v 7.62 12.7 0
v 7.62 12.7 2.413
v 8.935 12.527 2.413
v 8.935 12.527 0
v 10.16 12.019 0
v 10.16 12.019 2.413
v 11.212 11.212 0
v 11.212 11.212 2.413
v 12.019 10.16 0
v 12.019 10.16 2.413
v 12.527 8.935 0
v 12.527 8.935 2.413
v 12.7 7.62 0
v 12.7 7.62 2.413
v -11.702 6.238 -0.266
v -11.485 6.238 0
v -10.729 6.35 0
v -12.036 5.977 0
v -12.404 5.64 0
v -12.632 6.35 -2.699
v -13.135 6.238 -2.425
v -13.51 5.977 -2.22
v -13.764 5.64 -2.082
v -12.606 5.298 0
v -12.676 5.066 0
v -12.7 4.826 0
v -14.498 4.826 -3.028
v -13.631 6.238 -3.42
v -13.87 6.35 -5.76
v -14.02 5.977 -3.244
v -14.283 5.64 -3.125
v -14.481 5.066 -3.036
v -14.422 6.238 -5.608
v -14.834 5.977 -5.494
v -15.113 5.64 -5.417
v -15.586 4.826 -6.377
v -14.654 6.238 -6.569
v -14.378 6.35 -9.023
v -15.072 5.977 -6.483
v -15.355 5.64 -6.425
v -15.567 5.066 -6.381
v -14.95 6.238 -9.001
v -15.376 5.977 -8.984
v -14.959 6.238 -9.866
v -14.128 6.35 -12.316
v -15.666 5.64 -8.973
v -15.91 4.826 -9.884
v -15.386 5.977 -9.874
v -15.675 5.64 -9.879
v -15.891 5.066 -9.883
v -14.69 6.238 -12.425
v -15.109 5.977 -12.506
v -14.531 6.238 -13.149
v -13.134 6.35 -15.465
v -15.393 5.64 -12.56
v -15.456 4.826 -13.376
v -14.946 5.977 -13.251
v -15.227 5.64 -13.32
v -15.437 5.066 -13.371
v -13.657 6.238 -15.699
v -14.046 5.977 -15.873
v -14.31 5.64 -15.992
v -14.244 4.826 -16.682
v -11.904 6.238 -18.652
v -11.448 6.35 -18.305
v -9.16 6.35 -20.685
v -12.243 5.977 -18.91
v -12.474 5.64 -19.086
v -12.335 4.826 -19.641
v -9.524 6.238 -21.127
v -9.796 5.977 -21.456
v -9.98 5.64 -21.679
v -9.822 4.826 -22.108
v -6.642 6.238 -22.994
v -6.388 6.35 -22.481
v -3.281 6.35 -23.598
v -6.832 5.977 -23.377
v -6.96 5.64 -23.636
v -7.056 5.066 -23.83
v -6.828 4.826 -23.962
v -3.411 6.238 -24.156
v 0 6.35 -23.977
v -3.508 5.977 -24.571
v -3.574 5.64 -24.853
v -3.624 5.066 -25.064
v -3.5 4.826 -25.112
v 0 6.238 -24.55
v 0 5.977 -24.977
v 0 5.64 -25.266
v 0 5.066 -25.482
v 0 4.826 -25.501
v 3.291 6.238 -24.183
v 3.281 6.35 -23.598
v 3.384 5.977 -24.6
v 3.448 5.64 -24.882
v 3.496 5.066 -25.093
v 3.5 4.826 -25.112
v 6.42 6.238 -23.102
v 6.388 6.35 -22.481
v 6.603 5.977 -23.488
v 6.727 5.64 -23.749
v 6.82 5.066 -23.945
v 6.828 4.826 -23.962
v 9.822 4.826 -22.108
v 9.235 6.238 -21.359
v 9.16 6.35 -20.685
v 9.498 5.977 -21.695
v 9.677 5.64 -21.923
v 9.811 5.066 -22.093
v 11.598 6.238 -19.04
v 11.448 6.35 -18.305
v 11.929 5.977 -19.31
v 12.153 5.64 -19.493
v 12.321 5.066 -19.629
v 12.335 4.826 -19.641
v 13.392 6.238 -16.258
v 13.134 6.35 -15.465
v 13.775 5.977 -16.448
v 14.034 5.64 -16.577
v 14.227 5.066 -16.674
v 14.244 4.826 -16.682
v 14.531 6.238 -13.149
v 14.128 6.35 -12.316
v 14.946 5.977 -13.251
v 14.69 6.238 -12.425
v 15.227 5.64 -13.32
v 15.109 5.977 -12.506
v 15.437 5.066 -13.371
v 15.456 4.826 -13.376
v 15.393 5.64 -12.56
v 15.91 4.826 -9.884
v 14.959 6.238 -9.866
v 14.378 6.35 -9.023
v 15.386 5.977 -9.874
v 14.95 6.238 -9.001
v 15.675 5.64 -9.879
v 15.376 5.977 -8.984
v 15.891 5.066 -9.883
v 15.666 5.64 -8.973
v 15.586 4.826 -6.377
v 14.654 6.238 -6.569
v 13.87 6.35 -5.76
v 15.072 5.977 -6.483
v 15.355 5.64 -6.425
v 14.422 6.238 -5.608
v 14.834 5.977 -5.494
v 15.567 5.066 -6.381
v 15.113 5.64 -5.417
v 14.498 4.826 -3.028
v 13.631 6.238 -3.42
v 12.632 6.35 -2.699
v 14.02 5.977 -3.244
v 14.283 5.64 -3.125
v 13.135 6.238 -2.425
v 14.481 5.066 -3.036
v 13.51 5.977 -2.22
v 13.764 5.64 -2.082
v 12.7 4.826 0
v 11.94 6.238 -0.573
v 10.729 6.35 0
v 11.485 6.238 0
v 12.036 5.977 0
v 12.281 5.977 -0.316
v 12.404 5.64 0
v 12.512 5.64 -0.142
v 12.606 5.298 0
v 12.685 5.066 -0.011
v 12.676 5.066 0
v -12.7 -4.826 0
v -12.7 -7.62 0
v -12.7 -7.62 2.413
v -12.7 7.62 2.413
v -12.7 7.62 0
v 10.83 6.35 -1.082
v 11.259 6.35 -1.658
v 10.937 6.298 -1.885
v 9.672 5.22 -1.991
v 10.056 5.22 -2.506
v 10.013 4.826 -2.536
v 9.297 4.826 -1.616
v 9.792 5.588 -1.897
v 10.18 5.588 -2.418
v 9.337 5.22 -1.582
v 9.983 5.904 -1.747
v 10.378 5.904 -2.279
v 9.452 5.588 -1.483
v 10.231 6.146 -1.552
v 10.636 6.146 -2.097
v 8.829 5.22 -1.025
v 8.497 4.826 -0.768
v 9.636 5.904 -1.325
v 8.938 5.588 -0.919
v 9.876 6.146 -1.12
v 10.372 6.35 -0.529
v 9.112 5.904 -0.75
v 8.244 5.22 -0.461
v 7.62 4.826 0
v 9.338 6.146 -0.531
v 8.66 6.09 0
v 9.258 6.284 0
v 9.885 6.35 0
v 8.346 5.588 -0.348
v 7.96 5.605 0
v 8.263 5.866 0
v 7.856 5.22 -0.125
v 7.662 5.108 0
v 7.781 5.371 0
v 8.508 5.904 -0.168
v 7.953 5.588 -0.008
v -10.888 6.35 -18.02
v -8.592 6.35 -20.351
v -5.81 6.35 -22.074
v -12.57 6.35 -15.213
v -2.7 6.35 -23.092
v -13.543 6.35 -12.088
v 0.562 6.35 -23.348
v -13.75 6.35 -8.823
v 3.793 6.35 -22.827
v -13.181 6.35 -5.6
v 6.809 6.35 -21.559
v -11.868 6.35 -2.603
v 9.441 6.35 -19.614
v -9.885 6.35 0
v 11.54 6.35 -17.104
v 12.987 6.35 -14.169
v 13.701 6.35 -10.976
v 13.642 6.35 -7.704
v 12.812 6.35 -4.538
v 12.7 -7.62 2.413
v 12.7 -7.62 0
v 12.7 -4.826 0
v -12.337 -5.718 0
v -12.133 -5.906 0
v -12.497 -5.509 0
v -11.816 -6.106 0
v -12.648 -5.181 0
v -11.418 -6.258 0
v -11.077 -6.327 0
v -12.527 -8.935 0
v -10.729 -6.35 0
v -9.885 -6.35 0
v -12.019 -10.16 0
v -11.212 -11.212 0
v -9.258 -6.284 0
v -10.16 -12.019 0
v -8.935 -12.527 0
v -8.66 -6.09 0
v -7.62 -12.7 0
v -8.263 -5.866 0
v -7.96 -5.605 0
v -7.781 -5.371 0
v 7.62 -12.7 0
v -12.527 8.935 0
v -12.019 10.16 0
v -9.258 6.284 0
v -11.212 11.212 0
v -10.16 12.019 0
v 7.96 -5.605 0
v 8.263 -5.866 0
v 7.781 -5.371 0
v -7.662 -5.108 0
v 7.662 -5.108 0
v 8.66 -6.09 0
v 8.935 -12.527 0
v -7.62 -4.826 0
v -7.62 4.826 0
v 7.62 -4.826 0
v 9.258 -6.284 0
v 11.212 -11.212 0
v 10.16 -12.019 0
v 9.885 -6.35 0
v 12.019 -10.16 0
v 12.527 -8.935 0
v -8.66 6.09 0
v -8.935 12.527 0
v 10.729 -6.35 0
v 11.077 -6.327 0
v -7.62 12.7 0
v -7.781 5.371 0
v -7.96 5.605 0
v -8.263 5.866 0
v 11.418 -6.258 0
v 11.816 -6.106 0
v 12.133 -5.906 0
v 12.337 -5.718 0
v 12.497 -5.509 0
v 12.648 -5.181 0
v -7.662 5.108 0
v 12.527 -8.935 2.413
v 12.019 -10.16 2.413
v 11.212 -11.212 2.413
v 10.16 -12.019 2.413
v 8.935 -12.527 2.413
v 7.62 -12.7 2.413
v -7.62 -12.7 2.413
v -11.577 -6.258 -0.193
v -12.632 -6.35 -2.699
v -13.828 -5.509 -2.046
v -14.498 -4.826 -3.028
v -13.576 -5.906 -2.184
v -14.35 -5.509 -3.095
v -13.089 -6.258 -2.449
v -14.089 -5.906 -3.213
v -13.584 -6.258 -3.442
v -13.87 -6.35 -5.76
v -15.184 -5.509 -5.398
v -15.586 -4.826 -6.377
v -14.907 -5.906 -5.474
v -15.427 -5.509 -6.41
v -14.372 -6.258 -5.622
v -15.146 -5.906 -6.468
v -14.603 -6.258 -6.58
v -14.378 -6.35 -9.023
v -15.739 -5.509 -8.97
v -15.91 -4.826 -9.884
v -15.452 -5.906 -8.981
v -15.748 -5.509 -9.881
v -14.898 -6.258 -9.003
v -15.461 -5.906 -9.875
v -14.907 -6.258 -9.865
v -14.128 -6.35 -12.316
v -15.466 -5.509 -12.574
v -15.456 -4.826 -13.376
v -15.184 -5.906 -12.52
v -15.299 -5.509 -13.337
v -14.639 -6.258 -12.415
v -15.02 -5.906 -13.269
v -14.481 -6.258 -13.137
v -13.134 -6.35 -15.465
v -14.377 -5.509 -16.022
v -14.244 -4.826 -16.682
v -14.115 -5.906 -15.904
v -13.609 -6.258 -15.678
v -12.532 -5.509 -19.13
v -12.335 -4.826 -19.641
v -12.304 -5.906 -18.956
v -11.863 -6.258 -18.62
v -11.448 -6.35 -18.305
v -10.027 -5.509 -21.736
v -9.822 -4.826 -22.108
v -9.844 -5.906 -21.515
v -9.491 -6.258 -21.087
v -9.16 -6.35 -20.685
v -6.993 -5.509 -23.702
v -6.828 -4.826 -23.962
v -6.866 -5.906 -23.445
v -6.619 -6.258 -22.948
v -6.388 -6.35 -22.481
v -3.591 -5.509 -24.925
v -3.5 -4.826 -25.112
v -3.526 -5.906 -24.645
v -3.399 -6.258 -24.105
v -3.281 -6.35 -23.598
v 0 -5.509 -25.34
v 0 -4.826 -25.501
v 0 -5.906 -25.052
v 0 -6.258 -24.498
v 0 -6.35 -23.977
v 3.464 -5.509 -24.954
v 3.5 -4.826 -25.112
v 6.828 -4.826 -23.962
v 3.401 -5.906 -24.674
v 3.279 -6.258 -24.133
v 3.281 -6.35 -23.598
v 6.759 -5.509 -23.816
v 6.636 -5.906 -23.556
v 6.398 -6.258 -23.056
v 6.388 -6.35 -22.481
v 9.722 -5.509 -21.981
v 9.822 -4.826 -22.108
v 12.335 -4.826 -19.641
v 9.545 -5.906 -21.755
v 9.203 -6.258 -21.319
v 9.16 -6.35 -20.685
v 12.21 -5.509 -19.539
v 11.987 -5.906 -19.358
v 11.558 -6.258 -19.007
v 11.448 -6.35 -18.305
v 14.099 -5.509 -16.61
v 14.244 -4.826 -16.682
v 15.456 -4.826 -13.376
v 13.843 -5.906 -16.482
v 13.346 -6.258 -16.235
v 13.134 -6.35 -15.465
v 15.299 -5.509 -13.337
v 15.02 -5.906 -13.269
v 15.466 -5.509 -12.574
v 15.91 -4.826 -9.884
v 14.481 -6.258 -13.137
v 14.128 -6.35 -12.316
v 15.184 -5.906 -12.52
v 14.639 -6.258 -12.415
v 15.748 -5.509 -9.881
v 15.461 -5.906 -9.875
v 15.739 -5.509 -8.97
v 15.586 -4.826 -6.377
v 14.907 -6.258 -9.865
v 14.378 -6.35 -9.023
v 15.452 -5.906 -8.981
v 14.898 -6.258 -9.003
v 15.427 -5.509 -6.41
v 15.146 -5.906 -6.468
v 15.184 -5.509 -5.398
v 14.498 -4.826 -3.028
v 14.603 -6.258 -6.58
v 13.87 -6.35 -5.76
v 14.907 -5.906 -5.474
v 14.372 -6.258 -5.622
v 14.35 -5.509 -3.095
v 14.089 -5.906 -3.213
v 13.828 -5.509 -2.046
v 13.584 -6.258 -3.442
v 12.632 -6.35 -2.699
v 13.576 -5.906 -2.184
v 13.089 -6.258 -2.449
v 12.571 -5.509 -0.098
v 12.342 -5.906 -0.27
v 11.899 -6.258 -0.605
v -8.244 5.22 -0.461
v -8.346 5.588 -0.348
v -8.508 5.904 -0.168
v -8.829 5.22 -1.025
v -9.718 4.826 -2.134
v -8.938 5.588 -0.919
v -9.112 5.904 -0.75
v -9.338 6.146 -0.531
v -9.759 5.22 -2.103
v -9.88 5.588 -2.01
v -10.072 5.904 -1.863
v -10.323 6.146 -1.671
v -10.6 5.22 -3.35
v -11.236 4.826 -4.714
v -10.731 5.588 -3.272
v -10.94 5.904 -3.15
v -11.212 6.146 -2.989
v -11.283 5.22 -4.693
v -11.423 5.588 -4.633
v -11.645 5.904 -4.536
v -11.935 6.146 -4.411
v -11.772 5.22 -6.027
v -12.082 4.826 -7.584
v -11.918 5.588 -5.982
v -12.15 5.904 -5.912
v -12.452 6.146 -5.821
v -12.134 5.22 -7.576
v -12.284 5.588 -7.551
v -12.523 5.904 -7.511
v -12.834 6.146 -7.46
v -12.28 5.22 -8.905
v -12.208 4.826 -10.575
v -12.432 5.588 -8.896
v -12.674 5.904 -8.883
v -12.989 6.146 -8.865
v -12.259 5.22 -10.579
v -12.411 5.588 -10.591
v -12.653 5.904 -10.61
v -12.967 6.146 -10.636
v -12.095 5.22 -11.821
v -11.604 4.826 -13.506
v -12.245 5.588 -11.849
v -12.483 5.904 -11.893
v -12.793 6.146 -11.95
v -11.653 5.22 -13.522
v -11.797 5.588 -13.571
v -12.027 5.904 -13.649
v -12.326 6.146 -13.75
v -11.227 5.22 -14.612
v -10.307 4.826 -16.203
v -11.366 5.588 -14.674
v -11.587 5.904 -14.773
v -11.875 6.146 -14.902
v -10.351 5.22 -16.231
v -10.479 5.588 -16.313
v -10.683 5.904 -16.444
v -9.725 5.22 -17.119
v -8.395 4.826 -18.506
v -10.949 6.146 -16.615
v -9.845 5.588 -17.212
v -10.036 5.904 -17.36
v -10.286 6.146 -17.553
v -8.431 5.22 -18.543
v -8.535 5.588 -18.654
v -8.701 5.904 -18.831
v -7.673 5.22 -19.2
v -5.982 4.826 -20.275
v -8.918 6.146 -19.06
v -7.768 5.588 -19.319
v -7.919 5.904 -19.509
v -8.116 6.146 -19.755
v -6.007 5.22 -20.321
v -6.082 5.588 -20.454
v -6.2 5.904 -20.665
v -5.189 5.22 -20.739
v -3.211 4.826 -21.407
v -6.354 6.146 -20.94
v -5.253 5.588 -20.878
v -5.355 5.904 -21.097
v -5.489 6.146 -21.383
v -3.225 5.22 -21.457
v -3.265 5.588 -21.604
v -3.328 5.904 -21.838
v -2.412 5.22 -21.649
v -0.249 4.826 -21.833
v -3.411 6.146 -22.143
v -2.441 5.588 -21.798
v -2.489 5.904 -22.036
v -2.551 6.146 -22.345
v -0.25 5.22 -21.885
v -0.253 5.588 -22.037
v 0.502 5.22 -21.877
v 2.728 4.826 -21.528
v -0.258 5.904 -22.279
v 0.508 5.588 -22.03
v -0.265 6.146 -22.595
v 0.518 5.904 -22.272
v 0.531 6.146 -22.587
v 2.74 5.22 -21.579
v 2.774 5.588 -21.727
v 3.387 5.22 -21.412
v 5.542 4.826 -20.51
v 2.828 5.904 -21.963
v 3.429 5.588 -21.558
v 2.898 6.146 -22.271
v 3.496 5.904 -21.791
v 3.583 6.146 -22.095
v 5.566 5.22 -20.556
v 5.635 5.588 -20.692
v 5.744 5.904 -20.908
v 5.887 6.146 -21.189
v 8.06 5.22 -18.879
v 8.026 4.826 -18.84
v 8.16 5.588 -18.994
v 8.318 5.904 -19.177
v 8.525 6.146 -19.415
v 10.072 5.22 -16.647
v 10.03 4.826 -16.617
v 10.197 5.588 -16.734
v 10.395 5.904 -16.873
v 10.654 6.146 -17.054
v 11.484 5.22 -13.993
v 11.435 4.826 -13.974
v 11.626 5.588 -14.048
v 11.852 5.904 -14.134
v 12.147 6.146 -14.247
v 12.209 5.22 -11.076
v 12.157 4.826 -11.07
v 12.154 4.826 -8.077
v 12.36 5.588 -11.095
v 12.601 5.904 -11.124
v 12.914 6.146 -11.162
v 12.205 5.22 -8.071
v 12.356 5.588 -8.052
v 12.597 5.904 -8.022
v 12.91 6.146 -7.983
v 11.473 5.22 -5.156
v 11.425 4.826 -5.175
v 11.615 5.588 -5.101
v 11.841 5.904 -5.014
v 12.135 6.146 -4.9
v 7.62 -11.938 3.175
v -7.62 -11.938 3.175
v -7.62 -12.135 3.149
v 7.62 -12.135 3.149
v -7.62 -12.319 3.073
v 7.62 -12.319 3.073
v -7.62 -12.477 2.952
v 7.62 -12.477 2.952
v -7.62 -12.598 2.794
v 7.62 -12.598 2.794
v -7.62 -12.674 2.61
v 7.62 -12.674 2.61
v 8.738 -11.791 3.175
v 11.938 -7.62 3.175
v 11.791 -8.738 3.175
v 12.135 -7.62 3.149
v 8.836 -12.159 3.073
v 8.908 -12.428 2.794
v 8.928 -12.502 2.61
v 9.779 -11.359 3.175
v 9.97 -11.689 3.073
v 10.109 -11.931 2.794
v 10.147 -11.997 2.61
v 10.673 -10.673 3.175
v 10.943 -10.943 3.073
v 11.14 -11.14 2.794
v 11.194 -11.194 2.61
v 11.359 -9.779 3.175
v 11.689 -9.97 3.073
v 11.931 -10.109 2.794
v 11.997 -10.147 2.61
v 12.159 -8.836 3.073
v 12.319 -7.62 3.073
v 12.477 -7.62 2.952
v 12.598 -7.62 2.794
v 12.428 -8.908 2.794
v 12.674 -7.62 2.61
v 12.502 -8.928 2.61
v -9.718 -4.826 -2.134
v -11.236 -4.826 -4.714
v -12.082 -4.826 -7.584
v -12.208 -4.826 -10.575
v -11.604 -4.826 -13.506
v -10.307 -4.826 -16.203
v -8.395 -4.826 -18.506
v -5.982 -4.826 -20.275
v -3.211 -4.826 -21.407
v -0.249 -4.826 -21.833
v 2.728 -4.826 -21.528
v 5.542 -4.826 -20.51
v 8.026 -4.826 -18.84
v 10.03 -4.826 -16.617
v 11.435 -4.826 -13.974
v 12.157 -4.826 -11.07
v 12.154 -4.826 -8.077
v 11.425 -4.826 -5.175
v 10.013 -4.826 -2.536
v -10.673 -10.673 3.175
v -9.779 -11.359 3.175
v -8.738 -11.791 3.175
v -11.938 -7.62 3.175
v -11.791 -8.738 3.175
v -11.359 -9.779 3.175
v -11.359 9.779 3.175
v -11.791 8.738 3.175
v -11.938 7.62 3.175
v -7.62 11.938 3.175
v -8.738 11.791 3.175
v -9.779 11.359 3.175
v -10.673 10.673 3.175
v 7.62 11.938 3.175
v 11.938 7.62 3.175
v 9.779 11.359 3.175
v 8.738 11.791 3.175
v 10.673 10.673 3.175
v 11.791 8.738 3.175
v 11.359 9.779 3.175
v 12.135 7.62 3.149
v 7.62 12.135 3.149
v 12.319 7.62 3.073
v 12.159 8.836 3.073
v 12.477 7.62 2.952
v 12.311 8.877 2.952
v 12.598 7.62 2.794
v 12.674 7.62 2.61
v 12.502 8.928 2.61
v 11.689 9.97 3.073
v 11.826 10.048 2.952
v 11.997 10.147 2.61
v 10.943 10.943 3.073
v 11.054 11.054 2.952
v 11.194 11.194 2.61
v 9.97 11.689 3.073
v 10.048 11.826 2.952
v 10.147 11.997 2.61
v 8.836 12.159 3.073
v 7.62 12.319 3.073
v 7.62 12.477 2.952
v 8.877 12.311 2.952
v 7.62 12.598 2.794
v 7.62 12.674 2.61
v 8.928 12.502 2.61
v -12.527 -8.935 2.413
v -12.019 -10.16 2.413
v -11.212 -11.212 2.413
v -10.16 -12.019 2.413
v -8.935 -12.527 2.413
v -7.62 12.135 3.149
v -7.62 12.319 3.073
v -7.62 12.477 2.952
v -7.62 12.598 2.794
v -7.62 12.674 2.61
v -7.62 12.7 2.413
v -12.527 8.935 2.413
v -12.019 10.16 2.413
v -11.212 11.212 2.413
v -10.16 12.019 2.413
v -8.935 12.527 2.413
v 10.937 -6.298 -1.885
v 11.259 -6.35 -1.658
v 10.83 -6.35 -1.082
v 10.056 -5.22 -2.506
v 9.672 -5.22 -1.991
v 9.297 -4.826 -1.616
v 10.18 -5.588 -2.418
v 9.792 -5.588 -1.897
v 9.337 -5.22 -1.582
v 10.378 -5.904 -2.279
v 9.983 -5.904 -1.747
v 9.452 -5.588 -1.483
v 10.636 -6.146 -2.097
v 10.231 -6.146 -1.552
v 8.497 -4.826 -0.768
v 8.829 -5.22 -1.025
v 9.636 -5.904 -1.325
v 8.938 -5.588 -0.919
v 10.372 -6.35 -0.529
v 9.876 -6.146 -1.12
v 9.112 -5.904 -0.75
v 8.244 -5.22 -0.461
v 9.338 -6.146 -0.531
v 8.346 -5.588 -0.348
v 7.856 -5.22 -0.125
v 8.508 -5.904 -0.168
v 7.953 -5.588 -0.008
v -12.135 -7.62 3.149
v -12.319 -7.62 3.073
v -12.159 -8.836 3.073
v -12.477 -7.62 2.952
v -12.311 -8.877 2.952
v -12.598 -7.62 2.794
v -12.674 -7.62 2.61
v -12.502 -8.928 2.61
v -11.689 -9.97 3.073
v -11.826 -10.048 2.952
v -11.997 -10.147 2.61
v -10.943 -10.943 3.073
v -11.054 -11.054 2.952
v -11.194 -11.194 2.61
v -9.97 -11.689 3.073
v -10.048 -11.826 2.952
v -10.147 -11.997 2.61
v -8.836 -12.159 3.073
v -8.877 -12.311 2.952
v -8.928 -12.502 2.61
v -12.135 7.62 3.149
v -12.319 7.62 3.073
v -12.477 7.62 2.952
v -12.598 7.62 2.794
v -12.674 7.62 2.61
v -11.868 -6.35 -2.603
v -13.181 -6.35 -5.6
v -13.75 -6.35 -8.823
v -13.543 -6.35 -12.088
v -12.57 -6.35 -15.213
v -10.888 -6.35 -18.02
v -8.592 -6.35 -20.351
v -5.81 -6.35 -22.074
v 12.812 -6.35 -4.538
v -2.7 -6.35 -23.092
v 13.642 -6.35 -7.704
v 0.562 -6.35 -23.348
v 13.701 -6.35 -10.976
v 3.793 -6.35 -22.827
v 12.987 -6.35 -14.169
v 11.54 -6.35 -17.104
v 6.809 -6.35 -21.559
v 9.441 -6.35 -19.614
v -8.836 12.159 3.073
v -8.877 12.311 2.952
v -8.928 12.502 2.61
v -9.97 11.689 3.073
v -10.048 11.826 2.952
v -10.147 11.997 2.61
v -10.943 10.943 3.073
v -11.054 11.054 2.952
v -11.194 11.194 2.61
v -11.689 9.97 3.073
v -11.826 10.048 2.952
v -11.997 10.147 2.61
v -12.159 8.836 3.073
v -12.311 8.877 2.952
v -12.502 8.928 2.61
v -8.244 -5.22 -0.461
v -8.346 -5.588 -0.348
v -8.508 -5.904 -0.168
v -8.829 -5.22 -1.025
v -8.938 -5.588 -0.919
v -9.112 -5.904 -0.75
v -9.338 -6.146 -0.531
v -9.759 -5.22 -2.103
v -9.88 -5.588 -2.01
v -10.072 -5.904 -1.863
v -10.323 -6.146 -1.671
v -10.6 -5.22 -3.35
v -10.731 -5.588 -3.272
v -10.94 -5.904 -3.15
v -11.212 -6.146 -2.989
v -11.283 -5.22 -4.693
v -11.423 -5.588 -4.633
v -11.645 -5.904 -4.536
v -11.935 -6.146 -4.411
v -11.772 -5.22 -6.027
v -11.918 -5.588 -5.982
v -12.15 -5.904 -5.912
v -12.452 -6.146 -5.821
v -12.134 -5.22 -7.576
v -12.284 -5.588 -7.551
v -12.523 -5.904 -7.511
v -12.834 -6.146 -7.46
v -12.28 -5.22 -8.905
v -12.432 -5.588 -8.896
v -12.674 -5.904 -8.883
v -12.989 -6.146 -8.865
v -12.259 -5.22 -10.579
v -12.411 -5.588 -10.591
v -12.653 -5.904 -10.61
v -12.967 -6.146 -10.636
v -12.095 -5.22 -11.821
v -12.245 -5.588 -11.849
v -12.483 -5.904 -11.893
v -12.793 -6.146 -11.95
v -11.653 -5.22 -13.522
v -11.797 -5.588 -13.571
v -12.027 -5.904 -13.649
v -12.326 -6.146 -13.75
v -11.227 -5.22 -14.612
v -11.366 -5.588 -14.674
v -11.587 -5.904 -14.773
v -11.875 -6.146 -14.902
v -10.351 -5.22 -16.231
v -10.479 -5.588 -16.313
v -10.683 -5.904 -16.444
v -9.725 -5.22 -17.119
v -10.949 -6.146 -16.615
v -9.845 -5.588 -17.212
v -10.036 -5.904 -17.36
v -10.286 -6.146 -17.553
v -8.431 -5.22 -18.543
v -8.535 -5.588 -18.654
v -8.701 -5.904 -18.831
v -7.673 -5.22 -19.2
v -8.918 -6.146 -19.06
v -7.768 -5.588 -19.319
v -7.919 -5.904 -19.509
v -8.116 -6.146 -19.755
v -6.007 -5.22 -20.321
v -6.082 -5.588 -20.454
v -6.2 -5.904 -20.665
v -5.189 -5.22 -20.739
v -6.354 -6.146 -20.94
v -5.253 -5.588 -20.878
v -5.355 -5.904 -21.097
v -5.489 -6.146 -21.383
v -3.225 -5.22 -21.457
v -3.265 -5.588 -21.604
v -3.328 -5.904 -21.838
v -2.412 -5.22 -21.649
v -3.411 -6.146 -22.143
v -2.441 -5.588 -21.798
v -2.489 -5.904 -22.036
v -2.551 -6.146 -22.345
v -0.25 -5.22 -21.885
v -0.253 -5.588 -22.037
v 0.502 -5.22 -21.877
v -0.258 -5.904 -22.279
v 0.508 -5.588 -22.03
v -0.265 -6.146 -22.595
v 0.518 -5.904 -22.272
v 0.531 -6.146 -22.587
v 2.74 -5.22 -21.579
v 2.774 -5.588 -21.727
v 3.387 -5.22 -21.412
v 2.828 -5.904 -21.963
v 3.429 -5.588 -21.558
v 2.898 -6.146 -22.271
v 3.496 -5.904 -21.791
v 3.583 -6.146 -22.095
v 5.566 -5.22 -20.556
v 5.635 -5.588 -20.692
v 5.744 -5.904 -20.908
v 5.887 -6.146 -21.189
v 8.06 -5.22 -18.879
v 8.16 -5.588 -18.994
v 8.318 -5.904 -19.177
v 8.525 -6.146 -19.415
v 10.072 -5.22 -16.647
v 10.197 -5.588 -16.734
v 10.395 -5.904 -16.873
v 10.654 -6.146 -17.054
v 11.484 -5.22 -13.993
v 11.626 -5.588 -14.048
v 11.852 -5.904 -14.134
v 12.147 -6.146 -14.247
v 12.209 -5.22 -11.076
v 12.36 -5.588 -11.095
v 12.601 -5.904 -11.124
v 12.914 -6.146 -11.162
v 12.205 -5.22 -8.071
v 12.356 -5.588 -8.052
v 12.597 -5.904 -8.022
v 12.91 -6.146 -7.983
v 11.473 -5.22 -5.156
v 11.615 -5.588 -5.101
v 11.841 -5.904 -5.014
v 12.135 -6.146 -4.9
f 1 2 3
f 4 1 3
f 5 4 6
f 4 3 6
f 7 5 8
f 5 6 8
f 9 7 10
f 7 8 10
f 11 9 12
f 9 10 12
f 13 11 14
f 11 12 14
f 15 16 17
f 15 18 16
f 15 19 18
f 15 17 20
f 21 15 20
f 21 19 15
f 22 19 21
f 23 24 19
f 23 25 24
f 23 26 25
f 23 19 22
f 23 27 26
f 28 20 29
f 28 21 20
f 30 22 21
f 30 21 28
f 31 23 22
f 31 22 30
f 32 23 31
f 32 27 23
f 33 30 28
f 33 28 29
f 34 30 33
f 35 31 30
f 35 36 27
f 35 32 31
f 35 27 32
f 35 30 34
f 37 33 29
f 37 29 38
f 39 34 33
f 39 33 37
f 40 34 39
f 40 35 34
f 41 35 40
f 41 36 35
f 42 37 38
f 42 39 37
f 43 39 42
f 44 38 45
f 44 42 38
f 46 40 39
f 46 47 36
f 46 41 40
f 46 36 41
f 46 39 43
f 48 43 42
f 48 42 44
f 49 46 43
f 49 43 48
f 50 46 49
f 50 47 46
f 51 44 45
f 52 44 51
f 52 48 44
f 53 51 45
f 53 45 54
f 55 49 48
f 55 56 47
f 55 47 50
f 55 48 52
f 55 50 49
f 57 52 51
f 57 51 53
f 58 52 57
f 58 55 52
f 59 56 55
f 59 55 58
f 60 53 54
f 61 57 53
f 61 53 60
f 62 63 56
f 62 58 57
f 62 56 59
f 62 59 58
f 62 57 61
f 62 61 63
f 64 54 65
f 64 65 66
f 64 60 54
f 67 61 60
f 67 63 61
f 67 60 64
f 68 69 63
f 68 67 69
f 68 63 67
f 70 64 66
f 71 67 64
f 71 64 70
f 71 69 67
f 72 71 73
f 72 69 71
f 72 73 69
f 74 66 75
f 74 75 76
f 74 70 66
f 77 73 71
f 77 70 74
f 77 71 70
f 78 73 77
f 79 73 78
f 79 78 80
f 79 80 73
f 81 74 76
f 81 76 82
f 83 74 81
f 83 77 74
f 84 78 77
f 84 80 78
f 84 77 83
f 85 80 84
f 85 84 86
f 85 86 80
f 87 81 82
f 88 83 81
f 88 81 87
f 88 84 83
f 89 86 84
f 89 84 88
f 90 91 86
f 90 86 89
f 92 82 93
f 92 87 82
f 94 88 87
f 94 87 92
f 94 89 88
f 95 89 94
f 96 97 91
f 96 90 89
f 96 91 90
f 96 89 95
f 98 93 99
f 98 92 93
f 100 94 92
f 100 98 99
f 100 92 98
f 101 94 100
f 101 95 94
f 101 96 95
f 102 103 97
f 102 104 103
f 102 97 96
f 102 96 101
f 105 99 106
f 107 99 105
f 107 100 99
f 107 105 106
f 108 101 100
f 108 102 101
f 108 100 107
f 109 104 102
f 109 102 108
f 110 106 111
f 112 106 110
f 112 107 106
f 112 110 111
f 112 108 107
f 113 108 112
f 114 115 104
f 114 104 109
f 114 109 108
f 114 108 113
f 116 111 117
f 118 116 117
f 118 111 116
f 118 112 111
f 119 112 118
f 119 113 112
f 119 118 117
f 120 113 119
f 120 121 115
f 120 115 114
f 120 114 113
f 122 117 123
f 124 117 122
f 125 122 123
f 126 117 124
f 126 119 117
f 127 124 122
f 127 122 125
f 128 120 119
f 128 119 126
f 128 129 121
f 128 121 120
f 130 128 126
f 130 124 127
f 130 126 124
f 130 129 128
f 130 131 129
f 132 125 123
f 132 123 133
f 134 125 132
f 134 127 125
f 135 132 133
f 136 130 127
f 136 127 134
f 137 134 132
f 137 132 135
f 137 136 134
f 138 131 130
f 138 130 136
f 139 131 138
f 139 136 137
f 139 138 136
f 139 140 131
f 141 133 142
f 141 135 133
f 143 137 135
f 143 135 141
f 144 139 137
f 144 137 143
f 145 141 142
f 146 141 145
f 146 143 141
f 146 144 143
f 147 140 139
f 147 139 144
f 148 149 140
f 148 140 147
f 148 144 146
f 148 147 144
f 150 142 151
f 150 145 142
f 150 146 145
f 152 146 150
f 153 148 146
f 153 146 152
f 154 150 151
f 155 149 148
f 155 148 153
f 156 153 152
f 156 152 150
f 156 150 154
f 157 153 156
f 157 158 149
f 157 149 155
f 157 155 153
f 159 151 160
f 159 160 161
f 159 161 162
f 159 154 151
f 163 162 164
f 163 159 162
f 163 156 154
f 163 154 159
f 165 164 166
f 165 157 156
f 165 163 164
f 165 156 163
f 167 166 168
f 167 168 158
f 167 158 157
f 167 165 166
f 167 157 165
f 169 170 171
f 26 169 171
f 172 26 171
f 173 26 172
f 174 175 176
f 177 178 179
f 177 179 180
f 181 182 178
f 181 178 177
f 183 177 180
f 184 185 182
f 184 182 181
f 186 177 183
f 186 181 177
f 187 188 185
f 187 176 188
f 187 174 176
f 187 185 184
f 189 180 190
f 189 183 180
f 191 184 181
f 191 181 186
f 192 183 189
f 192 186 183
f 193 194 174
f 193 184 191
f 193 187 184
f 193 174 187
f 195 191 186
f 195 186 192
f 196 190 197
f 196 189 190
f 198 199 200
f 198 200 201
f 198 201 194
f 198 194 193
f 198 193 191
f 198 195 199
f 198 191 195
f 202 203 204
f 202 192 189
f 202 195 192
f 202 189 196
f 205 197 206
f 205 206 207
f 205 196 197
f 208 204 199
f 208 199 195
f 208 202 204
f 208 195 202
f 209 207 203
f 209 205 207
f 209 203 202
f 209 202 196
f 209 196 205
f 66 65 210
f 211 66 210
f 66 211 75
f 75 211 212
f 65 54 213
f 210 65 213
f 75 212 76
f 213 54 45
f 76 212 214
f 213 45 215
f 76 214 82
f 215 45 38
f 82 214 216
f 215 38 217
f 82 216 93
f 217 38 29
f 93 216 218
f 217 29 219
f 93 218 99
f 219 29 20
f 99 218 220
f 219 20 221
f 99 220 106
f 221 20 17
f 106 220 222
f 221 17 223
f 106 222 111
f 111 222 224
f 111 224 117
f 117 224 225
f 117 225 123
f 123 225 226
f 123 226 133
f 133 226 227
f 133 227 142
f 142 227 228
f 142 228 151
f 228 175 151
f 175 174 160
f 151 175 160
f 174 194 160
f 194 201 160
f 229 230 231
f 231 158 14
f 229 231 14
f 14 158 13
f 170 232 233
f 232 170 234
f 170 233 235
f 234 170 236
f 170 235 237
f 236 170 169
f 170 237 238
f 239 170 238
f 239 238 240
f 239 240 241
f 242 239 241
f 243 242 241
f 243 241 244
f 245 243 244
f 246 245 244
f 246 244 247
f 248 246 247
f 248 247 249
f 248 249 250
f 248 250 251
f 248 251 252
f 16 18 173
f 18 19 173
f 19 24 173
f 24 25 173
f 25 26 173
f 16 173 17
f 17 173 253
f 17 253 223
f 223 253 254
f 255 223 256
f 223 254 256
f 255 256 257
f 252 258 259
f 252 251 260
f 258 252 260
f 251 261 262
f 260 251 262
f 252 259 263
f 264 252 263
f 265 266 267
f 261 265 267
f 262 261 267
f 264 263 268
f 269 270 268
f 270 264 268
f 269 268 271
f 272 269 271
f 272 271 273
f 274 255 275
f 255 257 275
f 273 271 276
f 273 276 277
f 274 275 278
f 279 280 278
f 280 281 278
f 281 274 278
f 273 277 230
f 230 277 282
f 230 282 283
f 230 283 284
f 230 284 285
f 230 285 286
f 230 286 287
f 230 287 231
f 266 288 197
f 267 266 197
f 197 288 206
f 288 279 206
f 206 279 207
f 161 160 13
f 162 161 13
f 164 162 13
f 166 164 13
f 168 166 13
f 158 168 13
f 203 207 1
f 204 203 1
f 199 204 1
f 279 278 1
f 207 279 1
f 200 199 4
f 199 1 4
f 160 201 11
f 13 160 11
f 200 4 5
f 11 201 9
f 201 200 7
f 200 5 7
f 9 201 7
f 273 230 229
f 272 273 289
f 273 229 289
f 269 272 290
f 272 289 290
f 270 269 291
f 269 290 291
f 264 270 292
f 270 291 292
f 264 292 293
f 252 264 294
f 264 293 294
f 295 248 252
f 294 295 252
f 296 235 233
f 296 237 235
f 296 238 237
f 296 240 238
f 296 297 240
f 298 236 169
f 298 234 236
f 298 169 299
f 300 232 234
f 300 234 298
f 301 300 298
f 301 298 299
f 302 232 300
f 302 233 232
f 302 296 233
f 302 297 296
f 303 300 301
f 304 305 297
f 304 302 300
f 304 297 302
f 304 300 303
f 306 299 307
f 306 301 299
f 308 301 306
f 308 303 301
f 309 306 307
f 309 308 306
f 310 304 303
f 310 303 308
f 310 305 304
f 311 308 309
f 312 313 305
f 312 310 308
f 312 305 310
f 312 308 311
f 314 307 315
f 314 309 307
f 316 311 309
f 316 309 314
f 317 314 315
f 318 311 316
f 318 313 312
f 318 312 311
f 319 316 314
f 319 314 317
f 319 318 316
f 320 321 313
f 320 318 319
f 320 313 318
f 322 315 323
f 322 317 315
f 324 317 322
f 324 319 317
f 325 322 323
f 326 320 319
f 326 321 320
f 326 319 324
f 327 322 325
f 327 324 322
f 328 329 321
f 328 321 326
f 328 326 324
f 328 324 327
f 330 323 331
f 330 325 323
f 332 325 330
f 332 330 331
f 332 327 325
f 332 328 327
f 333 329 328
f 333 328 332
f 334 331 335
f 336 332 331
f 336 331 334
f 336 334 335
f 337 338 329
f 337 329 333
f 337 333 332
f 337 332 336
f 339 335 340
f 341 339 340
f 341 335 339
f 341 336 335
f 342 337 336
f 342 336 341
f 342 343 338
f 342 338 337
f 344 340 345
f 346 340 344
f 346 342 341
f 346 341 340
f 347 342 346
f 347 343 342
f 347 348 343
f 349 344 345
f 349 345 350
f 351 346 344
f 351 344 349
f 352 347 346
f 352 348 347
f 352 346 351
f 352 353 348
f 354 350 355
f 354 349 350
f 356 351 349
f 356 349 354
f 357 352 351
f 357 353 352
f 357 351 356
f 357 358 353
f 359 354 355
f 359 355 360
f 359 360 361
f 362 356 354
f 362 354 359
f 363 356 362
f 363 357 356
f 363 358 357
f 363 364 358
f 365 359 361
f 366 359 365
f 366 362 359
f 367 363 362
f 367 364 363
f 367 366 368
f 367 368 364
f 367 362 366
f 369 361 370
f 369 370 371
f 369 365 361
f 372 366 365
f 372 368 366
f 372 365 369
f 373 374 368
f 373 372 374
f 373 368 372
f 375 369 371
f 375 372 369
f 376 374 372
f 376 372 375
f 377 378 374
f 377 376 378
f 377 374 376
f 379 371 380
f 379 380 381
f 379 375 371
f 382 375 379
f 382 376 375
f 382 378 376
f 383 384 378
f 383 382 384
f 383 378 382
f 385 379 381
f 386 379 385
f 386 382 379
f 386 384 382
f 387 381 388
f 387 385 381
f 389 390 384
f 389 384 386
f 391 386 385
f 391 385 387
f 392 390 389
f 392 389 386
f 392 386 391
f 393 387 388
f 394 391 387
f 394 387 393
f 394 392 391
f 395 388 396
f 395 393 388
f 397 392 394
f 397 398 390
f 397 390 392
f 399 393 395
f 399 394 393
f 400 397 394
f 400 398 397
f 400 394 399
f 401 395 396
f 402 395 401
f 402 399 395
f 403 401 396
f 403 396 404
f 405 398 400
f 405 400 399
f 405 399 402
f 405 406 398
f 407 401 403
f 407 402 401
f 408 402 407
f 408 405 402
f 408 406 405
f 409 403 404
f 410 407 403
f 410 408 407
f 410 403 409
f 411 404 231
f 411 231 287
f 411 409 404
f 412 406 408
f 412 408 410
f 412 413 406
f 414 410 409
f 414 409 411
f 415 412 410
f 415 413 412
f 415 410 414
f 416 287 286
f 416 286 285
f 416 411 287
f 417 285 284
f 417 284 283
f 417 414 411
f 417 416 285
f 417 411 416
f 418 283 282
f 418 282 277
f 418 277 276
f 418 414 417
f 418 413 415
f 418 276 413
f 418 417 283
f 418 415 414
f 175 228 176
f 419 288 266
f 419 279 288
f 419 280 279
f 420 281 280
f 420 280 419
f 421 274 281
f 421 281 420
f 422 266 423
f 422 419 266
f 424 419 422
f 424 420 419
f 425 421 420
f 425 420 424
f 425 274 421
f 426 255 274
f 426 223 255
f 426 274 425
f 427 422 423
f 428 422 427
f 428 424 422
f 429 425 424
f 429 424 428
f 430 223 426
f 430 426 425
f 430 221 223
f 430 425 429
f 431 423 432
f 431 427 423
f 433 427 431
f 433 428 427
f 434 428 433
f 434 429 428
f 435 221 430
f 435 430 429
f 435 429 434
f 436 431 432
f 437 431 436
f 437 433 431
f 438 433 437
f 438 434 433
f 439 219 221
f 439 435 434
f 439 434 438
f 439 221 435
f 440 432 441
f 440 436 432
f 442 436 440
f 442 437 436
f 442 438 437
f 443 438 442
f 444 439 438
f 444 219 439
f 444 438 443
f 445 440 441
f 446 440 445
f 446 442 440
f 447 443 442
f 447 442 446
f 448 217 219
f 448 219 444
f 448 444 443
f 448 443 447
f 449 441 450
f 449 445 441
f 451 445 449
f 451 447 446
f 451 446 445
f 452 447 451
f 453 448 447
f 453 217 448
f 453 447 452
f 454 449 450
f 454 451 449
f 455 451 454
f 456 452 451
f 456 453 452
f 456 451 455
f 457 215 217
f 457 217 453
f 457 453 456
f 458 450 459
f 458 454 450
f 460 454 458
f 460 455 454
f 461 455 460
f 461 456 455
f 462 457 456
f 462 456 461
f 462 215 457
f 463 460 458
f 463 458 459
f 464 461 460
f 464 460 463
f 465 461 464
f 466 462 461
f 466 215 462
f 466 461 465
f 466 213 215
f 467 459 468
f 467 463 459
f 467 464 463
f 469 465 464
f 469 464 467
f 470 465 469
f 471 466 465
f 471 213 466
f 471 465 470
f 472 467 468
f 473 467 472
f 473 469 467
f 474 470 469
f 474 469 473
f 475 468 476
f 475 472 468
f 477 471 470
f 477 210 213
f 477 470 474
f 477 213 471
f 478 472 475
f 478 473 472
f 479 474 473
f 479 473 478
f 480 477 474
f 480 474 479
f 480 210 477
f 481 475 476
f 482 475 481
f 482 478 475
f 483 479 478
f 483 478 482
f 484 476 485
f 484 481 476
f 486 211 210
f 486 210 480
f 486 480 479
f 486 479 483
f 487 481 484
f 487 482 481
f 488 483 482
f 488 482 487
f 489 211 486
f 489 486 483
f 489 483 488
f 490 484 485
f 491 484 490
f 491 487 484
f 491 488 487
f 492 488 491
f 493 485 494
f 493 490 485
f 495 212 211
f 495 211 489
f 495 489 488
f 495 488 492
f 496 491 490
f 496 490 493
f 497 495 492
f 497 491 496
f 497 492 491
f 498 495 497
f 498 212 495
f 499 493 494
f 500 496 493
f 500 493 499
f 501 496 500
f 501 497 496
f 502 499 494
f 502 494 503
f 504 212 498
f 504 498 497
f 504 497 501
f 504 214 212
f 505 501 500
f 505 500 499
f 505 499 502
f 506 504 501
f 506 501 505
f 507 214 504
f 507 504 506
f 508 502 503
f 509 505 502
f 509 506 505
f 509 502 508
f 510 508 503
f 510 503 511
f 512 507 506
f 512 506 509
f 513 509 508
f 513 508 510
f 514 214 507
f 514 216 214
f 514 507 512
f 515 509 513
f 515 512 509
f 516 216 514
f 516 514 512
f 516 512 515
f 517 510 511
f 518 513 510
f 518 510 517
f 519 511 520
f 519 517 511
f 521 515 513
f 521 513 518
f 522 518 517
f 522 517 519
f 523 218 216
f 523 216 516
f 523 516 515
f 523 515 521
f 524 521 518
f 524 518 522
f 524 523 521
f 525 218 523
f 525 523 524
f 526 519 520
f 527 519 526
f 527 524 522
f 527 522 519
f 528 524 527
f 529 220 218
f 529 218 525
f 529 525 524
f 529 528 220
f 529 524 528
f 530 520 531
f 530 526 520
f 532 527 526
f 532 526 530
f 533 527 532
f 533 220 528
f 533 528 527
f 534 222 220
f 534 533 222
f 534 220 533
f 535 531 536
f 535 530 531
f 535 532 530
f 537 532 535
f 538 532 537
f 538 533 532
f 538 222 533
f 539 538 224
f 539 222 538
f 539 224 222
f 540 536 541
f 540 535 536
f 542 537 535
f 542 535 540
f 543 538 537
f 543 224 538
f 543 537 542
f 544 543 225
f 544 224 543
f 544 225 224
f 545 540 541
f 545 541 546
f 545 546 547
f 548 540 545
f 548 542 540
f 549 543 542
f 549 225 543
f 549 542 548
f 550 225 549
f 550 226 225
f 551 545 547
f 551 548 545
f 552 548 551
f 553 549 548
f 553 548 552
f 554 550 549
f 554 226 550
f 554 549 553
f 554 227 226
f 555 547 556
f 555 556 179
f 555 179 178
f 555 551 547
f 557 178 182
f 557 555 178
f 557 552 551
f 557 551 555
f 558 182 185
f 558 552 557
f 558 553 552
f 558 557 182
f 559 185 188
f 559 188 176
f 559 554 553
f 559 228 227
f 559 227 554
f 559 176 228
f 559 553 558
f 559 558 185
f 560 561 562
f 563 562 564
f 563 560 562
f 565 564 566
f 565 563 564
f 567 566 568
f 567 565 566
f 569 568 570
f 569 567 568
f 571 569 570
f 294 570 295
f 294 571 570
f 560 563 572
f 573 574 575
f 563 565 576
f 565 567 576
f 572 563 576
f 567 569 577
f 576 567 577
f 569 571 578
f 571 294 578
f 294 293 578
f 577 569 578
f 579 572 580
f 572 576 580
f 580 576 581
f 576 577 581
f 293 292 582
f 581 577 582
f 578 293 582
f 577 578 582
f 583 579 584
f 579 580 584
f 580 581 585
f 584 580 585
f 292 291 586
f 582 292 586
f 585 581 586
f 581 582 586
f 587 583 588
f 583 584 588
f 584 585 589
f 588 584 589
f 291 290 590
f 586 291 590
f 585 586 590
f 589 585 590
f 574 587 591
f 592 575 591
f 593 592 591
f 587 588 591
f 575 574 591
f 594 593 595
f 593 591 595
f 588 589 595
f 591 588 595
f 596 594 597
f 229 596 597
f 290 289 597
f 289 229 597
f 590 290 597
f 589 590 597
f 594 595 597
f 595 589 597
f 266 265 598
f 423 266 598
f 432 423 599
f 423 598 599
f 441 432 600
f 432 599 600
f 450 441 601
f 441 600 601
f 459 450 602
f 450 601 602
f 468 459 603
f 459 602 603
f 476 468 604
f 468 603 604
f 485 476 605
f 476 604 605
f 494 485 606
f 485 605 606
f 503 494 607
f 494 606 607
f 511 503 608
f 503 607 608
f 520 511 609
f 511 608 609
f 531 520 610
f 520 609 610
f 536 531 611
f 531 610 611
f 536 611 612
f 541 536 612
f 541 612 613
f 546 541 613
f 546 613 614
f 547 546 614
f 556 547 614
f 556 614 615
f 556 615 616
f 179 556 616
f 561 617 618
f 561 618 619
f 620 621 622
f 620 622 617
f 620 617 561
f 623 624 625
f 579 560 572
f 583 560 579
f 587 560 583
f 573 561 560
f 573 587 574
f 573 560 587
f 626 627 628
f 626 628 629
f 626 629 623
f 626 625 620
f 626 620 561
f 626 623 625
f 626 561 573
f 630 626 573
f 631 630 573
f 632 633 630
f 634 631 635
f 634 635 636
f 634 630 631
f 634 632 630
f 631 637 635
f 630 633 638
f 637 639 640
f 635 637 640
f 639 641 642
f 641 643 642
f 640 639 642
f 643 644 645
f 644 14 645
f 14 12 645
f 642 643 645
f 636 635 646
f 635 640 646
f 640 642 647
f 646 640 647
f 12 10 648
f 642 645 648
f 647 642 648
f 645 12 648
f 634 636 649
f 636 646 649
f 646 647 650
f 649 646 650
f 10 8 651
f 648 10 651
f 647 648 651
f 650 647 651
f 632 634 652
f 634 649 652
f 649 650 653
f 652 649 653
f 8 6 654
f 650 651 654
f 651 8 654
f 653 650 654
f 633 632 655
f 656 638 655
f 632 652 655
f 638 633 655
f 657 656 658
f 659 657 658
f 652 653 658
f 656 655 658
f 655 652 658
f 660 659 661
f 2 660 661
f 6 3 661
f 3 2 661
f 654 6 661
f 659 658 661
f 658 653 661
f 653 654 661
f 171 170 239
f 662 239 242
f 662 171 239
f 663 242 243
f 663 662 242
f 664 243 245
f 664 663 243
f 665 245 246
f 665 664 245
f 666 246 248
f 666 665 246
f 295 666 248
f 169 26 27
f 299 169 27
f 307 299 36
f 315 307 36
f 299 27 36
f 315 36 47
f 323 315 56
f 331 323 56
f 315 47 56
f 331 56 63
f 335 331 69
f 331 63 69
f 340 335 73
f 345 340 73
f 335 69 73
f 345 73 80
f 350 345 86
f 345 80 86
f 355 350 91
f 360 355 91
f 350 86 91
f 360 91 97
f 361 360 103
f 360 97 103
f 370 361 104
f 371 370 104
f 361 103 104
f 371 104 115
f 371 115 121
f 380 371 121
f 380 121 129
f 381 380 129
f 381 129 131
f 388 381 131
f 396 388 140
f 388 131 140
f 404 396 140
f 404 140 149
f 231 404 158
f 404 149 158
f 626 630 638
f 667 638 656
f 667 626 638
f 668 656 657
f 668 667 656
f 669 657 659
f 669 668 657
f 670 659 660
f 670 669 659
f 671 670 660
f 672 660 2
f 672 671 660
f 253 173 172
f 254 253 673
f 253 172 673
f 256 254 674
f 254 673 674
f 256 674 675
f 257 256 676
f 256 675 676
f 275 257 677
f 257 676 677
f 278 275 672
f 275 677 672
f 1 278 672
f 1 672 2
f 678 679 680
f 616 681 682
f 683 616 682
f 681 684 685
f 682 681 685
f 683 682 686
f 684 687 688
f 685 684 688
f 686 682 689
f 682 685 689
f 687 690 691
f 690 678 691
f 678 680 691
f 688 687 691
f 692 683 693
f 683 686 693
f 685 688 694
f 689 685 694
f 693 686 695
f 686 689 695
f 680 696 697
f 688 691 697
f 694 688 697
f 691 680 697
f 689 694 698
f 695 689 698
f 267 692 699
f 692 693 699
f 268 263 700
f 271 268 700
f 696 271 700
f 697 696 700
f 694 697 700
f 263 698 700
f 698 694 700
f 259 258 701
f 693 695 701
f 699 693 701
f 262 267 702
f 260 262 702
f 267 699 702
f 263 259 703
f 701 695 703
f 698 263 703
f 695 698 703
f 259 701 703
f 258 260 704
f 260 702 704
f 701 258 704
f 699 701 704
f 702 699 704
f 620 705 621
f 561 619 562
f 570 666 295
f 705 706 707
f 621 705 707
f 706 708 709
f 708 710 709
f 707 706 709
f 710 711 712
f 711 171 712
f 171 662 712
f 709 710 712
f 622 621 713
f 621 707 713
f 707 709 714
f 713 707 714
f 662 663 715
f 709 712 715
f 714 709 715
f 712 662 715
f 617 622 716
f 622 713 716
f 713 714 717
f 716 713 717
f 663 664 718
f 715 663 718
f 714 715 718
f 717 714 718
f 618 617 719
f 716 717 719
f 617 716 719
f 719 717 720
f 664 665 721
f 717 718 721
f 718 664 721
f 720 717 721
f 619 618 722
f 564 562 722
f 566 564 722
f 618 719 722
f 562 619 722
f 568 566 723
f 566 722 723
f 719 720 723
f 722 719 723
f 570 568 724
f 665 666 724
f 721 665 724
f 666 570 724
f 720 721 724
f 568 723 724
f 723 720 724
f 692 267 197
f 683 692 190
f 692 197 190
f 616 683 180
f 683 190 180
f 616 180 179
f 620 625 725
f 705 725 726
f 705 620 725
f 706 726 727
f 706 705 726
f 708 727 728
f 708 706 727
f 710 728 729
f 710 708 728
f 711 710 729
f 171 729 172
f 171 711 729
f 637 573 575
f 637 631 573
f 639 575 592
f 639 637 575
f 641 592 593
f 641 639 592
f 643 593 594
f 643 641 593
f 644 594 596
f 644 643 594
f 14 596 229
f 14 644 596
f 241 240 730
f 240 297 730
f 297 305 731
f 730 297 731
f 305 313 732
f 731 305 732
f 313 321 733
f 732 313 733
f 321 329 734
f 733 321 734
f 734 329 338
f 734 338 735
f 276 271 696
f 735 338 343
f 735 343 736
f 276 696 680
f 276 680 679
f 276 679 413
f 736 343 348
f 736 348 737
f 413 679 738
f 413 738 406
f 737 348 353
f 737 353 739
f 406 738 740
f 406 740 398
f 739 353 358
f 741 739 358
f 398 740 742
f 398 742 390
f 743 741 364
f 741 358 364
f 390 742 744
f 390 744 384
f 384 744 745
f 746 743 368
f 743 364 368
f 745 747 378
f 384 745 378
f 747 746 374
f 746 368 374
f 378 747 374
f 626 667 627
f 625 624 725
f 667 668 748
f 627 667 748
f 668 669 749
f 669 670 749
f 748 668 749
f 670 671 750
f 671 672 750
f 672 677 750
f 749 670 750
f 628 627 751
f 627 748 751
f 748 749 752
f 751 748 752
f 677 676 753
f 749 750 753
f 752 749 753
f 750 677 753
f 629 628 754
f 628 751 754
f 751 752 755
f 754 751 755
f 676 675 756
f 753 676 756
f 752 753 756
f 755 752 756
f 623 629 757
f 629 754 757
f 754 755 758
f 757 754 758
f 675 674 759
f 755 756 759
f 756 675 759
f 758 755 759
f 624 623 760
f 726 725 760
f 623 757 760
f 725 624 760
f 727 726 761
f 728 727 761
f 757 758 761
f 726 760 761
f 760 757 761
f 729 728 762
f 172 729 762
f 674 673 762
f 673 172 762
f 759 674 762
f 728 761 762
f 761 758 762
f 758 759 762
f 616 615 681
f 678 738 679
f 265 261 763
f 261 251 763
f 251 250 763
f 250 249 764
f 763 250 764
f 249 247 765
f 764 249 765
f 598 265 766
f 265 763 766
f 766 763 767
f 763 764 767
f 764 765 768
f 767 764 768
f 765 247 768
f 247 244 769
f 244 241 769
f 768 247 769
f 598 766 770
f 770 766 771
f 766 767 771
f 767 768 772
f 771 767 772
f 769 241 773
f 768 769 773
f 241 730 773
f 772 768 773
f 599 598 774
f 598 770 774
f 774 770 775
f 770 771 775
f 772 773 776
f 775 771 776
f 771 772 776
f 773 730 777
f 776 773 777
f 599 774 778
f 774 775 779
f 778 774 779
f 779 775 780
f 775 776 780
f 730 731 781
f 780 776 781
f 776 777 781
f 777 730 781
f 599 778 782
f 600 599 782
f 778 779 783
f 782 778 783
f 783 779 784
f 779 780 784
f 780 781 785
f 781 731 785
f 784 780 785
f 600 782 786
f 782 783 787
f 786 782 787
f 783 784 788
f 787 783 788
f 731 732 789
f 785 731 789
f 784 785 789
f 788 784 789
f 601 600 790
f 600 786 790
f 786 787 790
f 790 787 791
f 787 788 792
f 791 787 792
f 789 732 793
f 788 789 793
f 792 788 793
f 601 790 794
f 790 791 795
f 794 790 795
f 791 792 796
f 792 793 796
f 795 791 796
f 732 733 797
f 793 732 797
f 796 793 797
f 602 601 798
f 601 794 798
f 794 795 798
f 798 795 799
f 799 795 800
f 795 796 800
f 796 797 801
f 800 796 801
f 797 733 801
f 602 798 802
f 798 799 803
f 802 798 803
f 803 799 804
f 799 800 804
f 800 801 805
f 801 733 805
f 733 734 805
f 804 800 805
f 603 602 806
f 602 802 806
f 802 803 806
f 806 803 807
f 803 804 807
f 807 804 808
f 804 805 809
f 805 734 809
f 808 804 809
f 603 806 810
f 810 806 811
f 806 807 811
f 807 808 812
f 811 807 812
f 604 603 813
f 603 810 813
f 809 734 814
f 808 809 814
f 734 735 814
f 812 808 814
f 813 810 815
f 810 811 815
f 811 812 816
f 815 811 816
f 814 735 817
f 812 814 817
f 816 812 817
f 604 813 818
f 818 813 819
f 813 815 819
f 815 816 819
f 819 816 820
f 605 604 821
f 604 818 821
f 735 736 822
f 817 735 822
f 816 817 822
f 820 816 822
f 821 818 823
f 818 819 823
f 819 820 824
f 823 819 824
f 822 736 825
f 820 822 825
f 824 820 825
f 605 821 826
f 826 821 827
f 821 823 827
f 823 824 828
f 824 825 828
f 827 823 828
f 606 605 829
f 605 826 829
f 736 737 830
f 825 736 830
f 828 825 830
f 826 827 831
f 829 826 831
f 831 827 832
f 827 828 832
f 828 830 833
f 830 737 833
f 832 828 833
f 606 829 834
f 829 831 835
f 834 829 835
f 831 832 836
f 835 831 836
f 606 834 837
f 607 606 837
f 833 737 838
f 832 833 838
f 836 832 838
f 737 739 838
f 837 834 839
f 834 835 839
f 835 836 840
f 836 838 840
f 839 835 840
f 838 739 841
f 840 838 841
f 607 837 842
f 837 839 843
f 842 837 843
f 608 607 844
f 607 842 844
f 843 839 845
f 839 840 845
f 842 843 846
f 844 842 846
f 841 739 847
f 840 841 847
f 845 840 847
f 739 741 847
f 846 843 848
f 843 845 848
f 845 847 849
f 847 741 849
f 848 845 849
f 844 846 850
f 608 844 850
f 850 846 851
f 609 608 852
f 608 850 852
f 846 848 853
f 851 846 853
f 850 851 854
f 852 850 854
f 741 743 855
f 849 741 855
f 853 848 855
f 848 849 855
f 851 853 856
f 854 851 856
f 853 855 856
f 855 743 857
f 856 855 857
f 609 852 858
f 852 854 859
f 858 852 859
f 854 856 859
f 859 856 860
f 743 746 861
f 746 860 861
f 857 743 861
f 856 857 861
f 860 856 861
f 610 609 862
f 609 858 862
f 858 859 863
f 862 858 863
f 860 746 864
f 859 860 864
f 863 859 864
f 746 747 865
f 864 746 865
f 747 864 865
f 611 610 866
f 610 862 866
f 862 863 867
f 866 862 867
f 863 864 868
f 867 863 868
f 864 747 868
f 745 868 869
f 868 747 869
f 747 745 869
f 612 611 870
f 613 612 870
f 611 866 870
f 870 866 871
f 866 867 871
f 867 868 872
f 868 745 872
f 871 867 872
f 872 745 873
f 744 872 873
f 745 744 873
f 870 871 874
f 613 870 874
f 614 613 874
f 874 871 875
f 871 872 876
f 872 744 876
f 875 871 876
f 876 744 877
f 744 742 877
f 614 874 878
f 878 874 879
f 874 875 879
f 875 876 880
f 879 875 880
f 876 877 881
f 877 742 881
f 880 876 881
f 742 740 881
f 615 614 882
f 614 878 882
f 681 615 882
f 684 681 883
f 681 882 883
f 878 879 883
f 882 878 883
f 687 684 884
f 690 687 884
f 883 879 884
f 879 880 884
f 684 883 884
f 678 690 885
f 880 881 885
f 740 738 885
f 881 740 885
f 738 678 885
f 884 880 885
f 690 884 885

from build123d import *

# Parameters (mm, degrees)
F0_W     = 25.4
F0_H     = 25.4
F1_DEPTH = 3.175
F3_W     = 5.08
F3_H     = 12.7
F6_DEPTH = 6.35
F7_DEPTH = 6.35
F8_R     = 5.08
F9_R     = 1.524
F10_R    = 0.762


with BuildPart() as f1:
    # F0 (on Top) → F1 (new body)
    with BuildSketch(Plane.XY):
        Rectangle(F0_W, F0_H)
    extrude(amount=F1_DEPTH)

    # F4: sweep along a path in F2
    with BuildLine(Plane.XZ) as f4_path:
        ThreePointArc((-10.16, 0), (0, -23.5582897328), (10.16, 0))
    # F3 (on face) → F4 (sweep)
    with BuildSketch(Plane(origin=(0, 0, 0), x_dir=(1, 0, 0), z_dir=(0, 0, -1))):
        with Locations((-10.16, 0)):
            Rectangle(F3_W, F3_H)
    sweep(path=f4_path.line)

    # F5 (on Front) → F6 (join, through all)
    with BuildSketch(Plane.XZ):
        with BuildLine():
            Line((10.0130578512, -2.535746045), (10.16, 0))
            Line((10.16, 0), (7.62, 0))
            ThreePointArc((7.62, 0), (8.9072265211, -1.1822790439), (10.0130578512, -2.535746045))
        make_face()
    extrude(amount=-F6_DEPTH)

    # F7 (add, through all): a face of the model
    f7_faces = [f1.faces().sort_by_distance(p)[0] for p in [
        (9.3051055783, 0, -0.806788918),
    ]]
    extrude(f7_faces, amount=F7_DEPTH)

    # F8
    f8_edges = [f1.edges().sort_by_distance(p)[0] for p in [
        (12.7, -12.7, 1.5875),
        (12.7, 12.7, 1.5875),
        (-12.7, 12.7, 1.5875),
        (-12.7, -12.7, 1.5875),
    ]]
    fillet(f8_edges, radius=F8_R)

    # F9
    f9_edges = [f1.edges().sort_by_distance(p)[0] for p in [
        (-1.743325, -6.35, -21.711017),
        (-1.743325, 6.35, -21.711017),
        (0, 6.35, -25.501344),
        (0, -6.35, -25.501344),
        (8.907227, -6.35, -1.182279),
        (8.907227, 6.35, -1.182279),
    ]]
    fillet(f9_edges, radius=F9_R)

    # F10
    f10_edges = [f1.edges().sort_by_distance(p)[0] for p in [
        (12.7, 0, 3.175),
        (11.212102, -11.212102, 3.175),
        (11.212102, 11.212102, 3.175),
        (0, -12.7, 3.175),
        (0, 12.7, 3.175),
        (-11.212102, -11.212102, 3.175),
        (-11.212102, 11.212102, 3.175),
        (-12.7, 0, 3.175),
    ]]
    fillet(f10_edges, radius=F10_R)


solid = f1.part
